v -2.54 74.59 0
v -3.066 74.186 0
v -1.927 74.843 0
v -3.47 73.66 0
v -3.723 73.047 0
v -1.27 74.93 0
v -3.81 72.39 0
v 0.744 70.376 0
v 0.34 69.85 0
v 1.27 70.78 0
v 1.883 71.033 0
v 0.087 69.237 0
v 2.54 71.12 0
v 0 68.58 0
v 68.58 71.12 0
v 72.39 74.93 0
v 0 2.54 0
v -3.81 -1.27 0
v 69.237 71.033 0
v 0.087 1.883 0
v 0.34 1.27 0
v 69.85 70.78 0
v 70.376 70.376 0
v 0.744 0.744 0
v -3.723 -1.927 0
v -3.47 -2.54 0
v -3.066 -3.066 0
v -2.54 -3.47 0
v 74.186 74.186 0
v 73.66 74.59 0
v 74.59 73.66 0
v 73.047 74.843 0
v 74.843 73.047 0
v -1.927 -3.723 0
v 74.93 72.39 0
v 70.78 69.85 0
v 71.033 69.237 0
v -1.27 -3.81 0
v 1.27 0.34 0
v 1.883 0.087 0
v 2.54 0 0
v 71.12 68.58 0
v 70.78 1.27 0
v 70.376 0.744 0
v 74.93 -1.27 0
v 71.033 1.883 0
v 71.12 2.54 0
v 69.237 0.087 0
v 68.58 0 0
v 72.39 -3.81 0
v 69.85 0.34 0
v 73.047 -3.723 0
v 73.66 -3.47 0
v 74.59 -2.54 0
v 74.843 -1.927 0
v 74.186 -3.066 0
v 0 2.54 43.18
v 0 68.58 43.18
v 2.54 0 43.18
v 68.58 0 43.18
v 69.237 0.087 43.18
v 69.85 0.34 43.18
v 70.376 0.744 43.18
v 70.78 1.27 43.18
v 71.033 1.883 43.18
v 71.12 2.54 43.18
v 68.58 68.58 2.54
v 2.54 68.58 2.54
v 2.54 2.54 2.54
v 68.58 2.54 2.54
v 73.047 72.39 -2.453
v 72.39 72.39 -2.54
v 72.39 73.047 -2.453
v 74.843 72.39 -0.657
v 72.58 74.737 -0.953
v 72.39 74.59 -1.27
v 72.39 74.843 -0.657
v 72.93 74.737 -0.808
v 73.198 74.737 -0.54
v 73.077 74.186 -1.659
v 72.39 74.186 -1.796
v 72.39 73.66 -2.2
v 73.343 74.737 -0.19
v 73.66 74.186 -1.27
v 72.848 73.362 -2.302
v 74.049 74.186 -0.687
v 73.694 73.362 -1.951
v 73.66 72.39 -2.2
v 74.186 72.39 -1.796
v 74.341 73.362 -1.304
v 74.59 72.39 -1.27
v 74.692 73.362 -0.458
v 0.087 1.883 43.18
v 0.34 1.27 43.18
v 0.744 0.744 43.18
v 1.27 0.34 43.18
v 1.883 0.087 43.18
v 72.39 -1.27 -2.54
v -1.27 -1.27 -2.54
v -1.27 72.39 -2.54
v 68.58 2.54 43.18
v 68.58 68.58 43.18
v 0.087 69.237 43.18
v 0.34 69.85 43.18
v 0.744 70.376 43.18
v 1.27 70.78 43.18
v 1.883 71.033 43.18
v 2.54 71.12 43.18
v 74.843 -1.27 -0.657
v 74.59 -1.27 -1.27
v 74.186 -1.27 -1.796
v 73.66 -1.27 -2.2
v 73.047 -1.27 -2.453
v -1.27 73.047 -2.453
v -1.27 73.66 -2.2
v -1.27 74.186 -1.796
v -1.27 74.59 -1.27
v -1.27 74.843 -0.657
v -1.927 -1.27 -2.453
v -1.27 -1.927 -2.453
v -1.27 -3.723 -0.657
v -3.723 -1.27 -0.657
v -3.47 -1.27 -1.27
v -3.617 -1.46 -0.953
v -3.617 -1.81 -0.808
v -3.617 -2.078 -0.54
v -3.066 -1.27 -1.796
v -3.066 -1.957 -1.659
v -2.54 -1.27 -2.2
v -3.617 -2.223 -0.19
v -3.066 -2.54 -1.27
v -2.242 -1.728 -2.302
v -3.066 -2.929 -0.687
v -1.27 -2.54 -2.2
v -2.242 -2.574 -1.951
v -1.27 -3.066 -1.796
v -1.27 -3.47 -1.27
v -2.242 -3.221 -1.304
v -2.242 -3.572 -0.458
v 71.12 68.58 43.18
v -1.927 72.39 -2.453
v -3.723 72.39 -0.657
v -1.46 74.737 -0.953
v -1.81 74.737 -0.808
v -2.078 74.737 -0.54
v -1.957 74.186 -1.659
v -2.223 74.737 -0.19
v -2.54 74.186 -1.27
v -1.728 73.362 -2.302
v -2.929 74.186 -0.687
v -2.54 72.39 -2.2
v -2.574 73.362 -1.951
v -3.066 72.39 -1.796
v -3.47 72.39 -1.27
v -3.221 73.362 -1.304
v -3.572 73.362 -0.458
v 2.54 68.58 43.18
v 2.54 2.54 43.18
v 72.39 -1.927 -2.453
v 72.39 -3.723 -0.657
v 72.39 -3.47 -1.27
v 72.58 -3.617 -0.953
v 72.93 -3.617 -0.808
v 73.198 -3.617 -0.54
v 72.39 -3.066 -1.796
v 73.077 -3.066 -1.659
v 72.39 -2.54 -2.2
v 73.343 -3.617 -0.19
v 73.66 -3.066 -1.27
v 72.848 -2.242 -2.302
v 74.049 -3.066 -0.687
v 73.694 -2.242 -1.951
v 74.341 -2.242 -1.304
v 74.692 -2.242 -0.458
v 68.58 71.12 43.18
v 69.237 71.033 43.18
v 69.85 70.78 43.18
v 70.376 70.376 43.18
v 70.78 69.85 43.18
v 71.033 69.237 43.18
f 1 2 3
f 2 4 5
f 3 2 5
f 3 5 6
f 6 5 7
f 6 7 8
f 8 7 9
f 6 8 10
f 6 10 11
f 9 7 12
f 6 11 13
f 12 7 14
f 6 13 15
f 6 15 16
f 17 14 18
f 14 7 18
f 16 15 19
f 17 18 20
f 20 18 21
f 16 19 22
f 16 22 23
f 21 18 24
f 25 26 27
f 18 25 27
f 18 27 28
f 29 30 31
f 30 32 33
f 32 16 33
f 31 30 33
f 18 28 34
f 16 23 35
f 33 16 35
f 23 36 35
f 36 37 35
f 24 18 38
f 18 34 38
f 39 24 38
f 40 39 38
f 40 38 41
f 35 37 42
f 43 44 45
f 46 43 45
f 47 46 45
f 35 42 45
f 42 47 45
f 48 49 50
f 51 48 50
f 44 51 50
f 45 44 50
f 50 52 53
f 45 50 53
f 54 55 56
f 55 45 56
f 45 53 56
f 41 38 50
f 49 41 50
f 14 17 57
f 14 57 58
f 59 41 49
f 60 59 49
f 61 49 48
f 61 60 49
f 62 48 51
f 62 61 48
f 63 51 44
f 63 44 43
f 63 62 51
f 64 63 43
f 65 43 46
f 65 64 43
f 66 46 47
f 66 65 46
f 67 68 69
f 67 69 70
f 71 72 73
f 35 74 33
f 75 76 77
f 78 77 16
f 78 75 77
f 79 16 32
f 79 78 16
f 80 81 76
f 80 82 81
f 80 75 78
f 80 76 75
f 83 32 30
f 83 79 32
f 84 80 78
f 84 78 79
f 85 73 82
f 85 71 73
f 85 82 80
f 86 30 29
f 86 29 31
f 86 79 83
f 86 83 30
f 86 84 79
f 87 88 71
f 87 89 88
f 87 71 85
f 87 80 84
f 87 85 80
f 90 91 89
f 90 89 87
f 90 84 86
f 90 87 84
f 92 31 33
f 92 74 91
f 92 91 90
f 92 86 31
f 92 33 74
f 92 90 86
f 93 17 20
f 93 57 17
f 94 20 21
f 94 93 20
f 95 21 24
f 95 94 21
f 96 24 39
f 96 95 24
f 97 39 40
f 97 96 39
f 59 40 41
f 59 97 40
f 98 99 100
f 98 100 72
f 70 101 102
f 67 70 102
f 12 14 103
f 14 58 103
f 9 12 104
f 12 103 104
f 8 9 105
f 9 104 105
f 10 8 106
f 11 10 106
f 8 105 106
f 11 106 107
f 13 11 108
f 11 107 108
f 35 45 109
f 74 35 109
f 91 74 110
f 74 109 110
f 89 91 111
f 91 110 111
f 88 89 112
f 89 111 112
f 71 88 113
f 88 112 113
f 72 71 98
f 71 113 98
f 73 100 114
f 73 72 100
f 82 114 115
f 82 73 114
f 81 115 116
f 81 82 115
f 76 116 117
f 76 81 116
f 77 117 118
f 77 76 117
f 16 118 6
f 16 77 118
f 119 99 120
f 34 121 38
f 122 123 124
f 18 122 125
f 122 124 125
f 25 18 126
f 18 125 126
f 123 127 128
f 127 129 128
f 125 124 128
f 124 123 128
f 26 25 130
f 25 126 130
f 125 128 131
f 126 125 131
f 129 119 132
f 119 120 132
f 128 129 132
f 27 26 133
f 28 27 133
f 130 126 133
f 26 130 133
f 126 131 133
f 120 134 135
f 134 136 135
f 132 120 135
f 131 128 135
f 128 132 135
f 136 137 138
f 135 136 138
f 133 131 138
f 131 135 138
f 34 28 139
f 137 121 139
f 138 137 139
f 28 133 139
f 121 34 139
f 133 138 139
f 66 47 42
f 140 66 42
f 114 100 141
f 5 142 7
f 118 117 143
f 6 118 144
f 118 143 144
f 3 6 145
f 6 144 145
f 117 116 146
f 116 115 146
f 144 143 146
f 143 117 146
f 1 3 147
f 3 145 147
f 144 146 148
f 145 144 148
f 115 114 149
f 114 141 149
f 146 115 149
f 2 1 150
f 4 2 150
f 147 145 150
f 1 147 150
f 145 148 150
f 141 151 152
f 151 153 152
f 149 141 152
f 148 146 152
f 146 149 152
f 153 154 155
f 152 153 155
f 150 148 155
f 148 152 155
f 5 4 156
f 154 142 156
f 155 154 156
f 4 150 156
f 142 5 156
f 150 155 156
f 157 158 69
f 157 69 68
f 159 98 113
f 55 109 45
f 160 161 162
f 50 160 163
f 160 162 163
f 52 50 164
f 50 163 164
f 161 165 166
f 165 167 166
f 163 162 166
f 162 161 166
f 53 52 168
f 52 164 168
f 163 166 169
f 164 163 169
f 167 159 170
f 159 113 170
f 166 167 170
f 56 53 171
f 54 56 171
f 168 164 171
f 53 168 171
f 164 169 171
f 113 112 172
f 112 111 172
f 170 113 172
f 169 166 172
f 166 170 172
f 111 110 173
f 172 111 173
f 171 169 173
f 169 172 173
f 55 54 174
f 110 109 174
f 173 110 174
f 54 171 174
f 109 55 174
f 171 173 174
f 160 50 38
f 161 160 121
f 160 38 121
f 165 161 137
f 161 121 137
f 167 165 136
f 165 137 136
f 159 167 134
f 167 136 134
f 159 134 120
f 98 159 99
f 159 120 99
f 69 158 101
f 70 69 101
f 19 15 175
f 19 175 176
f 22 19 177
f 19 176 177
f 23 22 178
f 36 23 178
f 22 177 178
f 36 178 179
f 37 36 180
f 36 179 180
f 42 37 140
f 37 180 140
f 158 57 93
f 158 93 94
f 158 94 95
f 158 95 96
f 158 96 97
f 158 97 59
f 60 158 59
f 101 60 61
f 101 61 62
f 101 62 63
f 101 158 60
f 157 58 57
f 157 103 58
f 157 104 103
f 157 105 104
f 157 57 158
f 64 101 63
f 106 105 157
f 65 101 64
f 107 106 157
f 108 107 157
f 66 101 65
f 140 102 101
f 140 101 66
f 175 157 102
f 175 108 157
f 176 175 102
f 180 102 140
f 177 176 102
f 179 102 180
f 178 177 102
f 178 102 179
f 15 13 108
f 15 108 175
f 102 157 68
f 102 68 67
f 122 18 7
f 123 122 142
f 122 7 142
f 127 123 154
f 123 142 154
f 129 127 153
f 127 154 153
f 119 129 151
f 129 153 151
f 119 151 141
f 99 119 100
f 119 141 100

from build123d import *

# Parameters (mm, degrees)
F0_W     = 71.12
F0_H     = 71.12
F1_DEPTH = 43.18
F2_W     = 66.04
F2_H     = 66.04
F3_DEPTH = 40.64
F5_R     = 2.54
F4_W     = 71.12
F4_H     = 71.12
F4_W_2   = 3.81
F4_H_2   = 3.81
F6_DEPTH = 2.54
F7_R     = 2.53999


# Not quite as in the source:
# - a fillet or chamfer is up to 0.001 mm smaller than in the source, because OpenCascade refuses the exact size


with BuildPart() as f1:
    # F0 (on Top) → F1 (new body)
    with BuildSketch(Plane.XY):
        with Locations((35.56, 35.56)):
            Rectangle(F0_W, F0_H)
    extrude(amount=F1_DEPTH)

    # F2 (on face) → F3 (cut)
    with BuildSketch(Plane.XY.offset(43.18)):
        with Locations((35.56, 35.56)):
            Rectangle(F2_W, F2_H)
    extrude(amount=-F3_DEPTH, mode=Mode.SUBTRACT)

    # F5
    f5_edges = [f1.edges().sort_by_distance(p)[0] for p in [
        (71.12, 0, 21.59),
        (0, 0, 21.59),
        (0, 71.12, 21.59),
        (71.12, 71.12, 21.59),
    ]]
    fillet(f5_edges, radius=F5_R)

    # F4 (on face) → F6 (join)
    with BuildSketch(Plane(origin=(0, 0, 0), x_dir=(1, 0, 0), z_dir=(0, 0, -1))):
        Polygon((-3.81, -71.12), (0, -71.12), (0, -74.93), (74.93, -74.93), (74.93, 3.81), (-3.81, 3.81), align=None)
        with Locations((35.56, -35.56)):
            Rectangle(F4_W, F4_H, mode=Mode.SUBTRACT)
        with Locations((-1.905, -73.025)):
            Rectangle(F4_W_2, F4_H_2)
        with Locations((35.56, -35.56)):
            Rectangle(F4_W, F4_H)
    extrude(amount=F6_DEPTH)

    # F7 (radius 2.54 in the source; OpenCascade refuses exactly that, so slightly less here)
    f7_edges = [f1.edges().sort_by_distance(p)[0] for p in [
        (74.93, 35.56, -2.54),
        (35.56, -3.81, -2.54),
        (-3.81, 35.56, -2.54),
        (35.56, 74.93, -2.54),
        (-3.81, 74.93, -1.27),
        (74.93, 74.93, -1.27),
        (74.93, -3.81, -1.27),
        (-3.81, -3.81, -1.27),
    ]]
    fillet(f7_edges, radius=F7_R)


solid = f1.part
